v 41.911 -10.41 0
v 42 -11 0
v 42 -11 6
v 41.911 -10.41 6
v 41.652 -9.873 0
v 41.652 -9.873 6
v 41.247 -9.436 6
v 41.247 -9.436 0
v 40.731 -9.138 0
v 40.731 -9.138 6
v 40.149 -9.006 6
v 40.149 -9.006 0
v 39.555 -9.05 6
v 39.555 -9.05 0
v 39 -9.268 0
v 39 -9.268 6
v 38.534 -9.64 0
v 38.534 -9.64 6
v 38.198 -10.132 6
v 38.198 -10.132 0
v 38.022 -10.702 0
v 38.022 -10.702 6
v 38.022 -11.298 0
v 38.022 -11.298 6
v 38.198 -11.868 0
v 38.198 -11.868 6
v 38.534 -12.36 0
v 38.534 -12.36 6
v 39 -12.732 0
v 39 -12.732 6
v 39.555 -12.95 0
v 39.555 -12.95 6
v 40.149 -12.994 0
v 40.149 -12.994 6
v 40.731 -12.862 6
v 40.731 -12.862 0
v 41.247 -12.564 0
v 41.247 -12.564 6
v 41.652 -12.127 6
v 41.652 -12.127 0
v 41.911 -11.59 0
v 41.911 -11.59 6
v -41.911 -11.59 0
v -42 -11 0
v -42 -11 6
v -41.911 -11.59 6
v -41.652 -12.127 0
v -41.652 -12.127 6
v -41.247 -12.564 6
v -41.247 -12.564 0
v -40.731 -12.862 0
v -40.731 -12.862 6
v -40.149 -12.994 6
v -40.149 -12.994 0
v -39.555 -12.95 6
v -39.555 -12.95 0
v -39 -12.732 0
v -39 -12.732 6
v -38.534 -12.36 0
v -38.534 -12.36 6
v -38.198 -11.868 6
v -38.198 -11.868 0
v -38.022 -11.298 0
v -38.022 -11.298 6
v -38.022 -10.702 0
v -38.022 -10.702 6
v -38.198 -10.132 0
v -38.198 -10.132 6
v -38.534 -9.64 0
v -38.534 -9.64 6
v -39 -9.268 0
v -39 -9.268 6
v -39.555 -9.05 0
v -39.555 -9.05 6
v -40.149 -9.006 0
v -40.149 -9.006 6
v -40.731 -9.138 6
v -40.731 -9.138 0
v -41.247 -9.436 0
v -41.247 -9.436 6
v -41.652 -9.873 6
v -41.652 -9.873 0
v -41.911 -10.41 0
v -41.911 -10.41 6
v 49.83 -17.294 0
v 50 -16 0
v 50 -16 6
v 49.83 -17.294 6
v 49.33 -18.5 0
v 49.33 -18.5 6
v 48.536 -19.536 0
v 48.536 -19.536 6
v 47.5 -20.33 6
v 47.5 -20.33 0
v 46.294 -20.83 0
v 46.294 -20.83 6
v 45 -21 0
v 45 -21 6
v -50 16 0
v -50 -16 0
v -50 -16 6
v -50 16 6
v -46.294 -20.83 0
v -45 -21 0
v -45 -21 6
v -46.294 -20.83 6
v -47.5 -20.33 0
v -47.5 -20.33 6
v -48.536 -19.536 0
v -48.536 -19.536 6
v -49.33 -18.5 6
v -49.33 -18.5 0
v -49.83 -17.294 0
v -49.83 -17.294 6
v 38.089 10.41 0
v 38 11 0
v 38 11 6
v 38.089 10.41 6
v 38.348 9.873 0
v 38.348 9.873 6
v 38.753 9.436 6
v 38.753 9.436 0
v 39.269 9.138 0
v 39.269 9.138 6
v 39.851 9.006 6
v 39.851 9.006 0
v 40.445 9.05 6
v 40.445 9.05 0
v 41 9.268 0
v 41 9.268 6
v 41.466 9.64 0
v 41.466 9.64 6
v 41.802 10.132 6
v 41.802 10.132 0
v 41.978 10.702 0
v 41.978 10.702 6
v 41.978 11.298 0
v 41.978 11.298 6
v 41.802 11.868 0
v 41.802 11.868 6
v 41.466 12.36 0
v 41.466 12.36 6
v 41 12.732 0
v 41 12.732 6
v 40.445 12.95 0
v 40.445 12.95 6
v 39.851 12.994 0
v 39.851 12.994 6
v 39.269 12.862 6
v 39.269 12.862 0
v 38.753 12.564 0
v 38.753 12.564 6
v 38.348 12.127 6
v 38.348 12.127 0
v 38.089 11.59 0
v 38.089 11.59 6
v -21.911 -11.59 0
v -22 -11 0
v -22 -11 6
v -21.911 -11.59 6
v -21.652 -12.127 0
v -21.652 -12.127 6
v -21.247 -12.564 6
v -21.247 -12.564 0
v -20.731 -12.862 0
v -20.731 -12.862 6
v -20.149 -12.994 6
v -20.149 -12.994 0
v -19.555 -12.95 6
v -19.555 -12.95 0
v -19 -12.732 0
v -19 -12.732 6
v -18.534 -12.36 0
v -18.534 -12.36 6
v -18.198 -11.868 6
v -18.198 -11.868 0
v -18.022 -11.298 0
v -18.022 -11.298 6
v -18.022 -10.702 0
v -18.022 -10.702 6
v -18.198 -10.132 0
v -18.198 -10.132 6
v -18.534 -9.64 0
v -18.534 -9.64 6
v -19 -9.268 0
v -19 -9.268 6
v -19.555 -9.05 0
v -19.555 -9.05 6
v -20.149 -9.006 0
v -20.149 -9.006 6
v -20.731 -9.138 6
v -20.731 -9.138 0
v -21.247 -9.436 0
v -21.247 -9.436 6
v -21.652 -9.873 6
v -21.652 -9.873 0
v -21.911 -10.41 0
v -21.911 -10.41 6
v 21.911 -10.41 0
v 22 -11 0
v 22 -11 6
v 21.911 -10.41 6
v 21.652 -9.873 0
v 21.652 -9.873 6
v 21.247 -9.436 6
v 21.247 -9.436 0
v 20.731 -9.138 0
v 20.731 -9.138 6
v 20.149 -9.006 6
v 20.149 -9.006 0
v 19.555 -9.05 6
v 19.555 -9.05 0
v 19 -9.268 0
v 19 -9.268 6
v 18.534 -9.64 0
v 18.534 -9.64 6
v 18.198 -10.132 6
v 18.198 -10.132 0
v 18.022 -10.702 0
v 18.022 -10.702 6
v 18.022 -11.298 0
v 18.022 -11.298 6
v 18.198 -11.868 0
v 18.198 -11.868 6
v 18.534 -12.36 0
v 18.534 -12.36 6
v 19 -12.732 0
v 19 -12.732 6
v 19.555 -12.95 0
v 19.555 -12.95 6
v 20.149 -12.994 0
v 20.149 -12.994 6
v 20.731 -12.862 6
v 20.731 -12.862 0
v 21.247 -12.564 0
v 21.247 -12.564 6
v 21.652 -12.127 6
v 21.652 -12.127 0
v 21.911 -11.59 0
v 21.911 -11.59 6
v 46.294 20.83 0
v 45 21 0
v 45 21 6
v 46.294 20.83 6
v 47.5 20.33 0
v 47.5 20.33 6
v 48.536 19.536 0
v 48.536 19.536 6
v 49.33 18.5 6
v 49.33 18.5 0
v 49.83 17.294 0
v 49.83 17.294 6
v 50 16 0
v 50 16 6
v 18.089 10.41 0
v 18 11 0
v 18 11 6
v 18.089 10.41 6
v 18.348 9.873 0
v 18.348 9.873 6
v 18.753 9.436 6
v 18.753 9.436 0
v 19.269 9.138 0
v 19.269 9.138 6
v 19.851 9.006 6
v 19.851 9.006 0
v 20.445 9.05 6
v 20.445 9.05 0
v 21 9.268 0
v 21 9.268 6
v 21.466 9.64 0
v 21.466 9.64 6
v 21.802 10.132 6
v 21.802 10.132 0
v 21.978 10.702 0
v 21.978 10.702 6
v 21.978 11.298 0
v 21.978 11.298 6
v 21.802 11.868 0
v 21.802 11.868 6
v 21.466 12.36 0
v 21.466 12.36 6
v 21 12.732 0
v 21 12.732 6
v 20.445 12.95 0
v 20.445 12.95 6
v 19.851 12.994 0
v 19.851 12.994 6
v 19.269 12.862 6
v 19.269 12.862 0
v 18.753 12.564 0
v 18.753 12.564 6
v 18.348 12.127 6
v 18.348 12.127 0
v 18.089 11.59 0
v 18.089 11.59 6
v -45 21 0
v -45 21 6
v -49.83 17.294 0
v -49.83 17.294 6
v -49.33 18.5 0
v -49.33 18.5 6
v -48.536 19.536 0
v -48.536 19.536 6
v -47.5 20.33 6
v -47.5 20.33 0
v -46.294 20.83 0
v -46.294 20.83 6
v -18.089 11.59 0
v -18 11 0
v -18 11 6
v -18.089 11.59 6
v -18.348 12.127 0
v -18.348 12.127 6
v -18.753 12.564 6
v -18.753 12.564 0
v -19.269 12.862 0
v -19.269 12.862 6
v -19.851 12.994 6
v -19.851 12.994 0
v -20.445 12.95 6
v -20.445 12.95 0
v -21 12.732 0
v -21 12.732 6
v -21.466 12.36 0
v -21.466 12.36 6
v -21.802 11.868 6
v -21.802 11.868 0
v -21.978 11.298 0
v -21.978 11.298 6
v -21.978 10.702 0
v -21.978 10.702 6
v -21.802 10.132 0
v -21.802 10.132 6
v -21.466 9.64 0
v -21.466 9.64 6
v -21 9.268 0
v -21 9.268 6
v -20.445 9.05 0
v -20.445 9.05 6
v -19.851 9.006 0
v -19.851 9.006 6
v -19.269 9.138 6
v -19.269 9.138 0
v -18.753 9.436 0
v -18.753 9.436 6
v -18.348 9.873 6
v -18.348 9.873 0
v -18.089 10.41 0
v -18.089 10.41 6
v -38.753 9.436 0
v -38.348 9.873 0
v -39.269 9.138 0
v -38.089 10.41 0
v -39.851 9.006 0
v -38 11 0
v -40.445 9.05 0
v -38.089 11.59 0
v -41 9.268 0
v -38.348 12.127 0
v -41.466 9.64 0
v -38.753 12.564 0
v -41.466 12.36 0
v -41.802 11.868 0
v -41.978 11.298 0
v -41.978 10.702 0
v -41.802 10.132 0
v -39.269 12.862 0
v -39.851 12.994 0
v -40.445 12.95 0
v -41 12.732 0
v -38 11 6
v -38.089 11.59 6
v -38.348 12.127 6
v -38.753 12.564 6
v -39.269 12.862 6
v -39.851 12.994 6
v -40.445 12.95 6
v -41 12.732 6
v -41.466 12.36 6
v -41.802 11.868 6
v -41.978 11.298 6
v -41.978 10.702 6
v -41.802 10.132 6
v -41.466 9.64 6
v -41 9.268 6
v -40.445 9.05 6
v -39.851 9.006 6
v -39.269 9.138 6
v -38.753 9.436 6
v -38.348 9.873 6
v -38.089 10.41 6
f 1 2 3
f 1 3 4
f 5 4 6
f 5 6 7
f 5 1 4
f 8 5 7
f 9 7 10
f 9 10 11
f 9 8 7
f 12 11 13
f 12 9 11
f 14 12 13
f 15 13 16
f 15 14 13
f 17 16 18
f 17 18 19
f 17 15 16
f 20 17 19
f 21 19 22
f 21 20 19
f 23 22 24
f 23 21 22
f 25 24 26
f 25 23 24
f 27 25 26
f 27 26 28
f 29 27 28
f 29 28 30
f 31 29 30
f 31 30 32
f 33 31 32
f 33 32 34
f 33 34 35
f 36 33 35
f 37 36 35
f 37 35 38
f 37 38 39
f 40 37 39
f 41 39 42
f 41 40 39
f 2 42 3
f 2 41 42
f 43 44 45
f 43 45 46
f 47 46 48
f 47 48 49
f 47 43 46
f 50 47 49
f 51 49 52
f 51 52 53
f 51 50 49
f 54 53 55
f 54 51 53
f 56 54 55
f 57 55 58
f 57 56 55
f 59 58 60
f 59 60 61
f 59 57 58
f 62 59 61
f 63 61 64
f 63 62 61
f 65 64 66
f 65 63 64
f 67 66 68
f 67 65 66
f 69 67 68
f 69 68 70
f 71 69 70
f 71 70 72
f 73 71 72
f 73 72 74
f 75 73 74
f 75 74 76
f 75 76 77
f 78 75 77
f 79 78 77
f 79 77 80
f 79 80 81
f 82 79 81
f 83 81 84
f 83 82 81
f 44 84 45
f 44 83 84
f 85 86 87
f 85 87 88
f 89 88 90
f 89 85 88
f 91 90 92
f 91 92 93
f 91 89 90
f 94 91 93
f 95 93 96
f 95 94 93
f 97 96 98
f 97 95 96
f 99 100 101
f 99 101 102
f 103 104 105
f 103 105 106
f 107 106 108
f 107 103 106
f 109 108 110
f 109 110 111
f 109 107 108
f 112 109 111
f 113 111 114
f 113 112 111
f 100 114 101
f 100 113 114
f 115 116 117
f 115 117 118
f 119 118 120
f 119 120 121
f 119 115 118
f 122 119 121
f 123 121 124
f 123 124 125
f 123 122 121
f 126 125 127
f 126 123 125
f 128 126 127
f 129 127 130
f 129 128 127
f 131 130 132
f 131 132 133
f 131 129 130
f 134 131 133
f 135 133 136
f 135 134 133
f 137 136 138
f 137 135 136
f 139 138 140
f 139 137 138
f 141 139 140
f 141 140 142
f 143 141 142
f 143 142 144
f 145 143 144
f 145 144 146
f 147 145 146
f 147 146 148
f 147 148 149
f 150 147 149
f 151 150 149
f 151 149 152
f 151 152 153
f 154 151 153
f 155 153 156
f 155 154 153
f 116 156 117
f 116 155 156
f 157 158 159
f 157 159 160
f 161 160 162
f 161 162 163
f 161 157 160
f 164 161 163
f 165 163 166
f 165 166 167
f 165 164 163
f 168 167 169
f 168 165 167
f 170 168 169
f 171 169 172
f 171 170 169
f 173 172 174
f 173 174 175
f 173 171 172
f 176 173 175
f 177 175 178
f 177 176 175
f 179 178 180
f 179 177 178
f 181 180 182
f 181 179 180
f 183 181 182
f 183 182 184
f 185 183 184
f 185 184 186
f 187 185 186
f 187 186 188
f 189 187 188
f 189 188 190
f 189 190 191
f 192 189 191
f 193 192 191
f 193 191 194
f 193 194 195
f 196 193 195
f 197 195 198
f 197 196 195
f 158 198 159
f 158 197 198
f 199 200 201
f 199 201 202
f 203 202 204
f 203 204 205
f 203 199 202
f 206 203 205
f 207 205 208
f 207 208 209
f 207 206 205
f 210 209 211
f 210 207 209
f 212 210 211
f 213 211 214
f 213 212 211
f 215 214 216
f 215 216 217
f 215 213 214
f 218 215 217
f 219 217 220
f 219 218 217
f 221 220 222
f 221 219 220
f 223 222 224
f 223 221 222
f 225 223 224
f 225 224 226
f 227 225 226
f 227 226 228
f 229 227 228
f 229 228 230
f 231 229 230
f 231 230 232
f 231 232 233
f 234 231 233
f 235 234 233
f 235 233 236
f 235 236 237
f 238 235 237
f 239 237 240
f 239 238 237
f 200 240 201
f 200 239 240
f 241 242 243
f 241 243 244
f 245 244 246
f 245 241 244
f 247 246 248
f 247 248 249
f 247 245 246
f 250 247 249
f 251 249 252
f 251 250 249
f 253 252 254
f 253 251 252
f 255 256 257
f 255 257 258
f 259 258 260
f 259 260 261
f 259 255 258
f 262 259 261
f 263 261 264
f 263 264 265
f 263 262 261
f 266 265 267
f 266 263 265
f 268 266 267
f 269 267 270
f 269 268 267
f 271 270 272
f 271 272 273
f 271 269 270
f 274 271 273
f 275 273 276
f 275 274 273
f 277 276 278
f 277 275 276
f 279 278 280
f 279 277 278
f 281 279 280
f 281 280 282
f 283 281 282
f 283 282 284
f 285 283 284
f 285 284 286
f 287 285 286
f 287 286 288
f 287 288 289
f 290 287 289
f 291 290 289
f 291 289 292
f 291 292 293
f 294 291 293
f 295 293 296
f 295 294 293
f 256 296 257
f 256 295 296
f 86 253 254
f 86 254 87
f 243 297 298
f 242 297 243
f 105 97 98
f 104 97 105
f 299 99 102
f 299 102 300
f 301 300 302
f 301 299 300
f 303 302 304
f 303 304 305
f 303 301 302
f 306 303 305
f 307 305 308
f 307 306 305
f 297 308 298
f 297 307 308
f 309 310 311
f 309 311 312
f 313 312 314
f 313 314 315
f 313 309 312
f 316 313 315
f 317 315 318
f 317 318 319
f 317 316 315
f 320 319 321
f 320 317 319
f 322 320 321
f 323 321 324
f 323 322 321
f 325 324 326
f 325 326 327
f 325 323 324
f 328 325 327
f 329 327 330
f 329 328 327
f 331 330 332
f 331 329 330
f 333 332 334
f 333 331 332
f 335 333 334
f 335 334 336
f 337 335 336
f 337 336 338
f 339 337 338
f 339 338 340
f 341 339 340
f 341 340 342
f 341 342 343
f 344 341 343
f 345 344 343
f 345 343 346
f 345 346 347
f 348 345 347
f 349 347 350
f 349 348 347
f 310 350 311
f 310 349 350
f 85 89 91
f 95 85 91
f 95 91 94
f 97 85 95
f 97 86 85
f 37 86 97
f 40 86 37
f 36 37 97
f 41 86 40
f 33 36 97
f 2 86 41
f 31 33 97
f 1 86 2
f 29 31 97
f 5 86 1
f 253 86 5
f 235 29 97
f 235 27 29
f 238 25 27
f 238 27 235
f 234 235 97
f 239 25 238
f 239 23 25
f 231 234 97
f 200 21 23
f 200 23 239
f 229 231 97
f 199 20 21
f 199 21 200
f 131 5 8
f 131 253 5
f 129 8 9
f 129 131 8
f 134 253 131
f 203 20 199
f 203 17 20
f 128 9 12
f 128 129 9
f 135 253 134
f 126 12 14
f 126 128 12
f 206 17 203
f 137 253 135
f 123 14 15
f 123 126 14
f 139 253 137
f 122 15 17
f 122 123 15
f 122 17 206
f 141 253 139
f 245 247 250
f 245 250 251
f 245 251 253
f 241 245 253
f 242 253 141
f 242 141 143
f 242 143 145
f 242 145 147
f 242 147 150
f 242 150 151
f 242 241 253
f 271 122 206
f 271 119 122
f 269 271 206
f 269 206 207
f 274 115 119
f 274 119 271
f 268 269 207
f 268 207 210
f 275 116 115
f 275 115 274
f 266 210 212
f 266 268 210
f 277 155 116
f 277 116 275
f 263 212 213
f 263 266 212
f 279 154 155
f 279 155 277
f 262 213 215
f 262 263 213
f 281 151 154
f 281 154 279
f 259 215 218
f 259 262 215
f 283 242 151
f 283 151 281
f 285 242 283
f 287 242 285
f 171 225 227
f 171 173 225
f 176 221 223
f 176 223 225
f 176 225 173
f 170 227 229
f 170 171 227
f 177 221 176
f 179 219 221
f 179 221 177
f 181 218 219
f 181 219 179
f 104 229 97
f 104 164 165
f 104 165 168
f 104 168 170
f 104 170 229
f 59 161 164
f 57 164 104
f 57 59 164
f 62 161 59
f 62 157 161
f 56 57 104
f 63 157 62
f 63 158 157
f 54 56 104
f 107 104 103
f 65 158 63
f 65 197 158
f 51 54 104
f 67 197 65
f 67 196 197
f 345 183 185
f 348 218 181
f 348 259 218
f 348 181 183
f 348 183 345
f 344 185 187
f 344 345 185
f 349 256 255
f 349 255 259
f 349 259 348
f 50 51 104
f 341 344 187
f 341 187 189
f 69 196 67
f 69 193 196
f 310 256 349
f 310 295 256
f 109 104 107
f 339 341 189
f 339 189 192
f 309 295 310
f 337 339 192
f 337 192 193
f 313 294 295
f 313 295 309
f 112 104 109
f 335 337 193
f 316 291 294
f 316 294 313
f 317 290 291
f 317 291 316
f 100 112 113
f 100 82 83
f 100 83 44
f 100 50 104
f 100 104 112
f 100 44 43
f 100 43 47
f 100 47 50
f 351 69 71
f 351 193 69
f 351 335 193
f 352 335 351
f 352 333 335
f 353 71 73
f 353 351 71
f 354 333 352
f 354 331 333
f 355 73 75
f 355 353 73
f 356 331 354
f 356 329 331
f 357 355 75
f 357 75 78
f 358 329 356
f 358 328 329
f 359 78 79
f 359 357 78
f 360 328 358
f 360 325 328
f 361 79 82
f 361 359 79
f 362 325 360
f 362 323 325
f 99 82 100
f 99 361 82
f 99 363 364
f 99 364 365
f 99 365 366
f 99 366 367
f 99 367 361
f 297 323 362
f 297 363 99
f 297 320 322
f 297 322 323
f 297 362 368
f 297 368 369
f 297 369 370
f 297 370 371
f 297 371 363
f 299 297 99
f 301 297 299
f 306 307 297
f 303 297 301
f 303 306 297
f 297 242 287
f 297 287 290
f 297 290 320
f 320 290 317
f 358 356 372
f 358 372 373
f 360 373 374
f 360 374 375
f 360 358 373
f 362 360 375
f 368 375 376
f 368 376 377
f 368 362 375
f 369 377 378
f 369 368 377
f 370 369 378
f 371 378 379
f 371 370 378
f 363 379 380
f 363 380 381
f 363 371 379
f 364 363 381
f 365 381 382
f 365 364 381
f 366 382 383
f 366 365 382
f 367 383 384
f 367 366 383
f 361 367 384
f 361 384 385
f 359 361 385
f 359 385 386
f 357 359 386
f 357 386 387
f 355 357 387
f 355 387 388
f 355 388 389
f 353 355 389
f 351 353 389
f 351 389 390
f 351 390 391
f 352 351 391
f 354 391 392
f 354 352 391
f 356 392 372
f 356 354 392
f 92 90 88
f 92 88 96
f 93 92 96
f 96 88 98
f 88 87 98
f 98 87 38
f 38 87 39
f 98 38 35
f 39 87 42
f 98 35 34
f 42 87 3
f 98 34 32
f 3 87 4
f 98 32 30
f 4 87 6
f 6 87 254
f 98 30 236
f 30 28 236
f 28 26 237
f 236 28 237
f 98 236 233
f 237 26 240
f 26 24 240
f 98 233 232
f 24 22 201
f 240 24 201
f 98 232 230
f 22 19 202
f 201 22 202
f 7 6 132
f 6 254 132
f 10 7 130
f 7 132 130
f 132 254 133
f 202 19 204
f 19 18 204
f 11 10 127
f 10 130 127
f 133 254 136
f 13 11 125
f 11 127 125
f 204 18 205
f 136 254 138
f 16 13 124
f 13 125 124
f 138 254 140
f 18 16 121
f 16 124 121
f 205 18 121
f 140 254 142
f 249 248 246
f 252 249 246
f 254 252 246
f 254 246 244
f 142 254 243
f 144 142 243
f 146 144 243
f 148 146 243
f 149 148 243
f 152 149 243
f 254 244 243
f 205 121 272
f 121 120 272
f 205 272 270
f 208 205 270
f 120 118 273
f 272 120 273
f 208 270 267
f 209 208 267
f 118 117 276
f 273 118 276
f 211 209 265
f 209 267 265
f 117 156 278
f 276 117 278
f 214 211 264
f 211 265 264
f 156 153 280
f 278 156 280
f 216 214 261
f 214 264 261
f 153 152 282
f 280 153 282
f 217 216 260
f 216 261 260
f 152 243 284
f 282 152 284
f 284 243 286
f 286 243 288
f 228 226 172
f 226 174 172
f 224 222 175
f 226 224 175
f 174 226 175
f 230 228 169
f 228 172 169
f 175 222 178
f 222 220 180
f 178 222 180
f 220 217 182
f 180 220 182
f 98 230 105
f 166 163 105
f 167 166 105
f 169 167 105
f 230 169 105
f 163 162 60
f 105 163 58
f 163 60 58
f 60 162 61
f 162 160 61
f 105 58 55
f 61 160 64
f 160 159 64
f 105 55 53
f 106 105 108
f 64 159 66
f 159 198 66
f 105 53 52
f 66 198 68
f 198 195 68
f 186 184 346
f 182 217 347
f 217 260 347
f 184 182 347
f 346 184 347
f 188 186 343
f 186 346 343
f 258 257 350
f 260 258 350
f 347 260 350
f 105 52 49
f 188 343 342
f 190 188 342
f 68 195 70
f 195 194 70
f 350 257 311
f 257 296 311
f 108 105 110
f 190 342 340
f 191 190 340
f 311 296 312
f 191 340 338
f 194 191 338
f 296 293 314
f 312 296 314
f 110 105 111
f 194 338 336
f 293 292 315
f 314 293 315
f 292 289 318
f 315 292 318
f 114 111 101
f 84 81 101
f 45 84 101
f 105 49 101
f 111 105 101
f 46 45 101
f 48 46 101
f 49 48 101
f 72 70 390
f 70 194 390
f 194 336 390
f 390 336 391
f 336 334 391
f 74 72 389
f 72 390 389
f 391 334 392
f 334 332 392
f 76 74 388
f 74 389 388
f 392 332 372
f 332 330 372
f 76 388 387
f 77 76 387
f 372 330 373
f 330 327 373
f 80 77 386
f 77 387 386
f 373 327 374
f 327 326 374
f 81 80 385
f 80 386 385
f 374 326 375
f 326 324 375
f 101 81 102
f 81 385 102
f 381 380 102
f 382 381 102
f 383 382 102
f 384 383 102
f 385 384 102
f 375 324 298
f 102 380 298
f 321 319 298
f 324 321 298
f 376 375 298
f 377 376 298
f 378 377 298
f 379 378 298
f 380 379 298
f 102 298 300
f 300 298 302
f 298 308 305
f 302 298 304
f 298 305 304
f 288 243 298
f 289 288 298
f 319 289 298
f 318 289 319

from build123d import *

# Parameters (mm, degrees)
SKETCH_1_R      = 2
EXTRUDE_1_DEPTH = 6


with BuildPart() as part:
    # Эскиз1 → Бобышка-Вытянуть1 (new body)
    with BuildSketch(Plane.XY):
        with BuildLine():
            Line((45, -21), (-45, -21))
            ThreePointArc((-45, -21), (-48.535533906, -19.535533906), (-50, -16))
            Line((-50, -16), (-50, 16))
            ThreePointArc((-50, 16), (-48.535533906, 19.535533906), (-45, 21))
            Line((-45, 21), (45, 21))
            ThreePointArc((45, 21), (48.535533906, 19.535533906), (50, 16))
            Line((50, 16), (50, -16))
            ThreePointArc((50, -16), (48.535533906, -19.535533906), (45, -21))
        make_face()
        with Locations((-40, 11)):
            Circle(SKETCH_1_R, mode=Mode.SUBTRACT)
        with Locations((-20, 11)):
            Circle(SKETCH_1_R, mode=Mode.SUBTRACT)
        with Locations(Location((-40, -11, 0), (0, 0, 180))):
            Circle(SKETCH_1_R, mode=Mode.SUBTRACT)
        with Locations(Location((-20, -11, 0), (0, 0, 180))):
            Circle(SKETCH_1_R, mode=Mode.SUBTRACT)
        with Locations((20, -11)):
            Circle(SKETCH_1_R, mode=Mode.SUBTRACT)
        with Locations((40, -11)):
            Circle(SKETCH_1_R, mode=Mode.SUBTRACT)
        with Locations(Location((40, 11, 0), (0, 0, 180))):
            Circle(SKETCH_1_R, mode=Mode.SUBTRACT)
        with Locations(Location((20, 11, 0), (0, 0, 180))):
            Circle(SKETCH_1_R, mode=Mode.SUBTRACT)
    extrude(amount=EXTRUDE_1_DEPTH)


solid = part.part
